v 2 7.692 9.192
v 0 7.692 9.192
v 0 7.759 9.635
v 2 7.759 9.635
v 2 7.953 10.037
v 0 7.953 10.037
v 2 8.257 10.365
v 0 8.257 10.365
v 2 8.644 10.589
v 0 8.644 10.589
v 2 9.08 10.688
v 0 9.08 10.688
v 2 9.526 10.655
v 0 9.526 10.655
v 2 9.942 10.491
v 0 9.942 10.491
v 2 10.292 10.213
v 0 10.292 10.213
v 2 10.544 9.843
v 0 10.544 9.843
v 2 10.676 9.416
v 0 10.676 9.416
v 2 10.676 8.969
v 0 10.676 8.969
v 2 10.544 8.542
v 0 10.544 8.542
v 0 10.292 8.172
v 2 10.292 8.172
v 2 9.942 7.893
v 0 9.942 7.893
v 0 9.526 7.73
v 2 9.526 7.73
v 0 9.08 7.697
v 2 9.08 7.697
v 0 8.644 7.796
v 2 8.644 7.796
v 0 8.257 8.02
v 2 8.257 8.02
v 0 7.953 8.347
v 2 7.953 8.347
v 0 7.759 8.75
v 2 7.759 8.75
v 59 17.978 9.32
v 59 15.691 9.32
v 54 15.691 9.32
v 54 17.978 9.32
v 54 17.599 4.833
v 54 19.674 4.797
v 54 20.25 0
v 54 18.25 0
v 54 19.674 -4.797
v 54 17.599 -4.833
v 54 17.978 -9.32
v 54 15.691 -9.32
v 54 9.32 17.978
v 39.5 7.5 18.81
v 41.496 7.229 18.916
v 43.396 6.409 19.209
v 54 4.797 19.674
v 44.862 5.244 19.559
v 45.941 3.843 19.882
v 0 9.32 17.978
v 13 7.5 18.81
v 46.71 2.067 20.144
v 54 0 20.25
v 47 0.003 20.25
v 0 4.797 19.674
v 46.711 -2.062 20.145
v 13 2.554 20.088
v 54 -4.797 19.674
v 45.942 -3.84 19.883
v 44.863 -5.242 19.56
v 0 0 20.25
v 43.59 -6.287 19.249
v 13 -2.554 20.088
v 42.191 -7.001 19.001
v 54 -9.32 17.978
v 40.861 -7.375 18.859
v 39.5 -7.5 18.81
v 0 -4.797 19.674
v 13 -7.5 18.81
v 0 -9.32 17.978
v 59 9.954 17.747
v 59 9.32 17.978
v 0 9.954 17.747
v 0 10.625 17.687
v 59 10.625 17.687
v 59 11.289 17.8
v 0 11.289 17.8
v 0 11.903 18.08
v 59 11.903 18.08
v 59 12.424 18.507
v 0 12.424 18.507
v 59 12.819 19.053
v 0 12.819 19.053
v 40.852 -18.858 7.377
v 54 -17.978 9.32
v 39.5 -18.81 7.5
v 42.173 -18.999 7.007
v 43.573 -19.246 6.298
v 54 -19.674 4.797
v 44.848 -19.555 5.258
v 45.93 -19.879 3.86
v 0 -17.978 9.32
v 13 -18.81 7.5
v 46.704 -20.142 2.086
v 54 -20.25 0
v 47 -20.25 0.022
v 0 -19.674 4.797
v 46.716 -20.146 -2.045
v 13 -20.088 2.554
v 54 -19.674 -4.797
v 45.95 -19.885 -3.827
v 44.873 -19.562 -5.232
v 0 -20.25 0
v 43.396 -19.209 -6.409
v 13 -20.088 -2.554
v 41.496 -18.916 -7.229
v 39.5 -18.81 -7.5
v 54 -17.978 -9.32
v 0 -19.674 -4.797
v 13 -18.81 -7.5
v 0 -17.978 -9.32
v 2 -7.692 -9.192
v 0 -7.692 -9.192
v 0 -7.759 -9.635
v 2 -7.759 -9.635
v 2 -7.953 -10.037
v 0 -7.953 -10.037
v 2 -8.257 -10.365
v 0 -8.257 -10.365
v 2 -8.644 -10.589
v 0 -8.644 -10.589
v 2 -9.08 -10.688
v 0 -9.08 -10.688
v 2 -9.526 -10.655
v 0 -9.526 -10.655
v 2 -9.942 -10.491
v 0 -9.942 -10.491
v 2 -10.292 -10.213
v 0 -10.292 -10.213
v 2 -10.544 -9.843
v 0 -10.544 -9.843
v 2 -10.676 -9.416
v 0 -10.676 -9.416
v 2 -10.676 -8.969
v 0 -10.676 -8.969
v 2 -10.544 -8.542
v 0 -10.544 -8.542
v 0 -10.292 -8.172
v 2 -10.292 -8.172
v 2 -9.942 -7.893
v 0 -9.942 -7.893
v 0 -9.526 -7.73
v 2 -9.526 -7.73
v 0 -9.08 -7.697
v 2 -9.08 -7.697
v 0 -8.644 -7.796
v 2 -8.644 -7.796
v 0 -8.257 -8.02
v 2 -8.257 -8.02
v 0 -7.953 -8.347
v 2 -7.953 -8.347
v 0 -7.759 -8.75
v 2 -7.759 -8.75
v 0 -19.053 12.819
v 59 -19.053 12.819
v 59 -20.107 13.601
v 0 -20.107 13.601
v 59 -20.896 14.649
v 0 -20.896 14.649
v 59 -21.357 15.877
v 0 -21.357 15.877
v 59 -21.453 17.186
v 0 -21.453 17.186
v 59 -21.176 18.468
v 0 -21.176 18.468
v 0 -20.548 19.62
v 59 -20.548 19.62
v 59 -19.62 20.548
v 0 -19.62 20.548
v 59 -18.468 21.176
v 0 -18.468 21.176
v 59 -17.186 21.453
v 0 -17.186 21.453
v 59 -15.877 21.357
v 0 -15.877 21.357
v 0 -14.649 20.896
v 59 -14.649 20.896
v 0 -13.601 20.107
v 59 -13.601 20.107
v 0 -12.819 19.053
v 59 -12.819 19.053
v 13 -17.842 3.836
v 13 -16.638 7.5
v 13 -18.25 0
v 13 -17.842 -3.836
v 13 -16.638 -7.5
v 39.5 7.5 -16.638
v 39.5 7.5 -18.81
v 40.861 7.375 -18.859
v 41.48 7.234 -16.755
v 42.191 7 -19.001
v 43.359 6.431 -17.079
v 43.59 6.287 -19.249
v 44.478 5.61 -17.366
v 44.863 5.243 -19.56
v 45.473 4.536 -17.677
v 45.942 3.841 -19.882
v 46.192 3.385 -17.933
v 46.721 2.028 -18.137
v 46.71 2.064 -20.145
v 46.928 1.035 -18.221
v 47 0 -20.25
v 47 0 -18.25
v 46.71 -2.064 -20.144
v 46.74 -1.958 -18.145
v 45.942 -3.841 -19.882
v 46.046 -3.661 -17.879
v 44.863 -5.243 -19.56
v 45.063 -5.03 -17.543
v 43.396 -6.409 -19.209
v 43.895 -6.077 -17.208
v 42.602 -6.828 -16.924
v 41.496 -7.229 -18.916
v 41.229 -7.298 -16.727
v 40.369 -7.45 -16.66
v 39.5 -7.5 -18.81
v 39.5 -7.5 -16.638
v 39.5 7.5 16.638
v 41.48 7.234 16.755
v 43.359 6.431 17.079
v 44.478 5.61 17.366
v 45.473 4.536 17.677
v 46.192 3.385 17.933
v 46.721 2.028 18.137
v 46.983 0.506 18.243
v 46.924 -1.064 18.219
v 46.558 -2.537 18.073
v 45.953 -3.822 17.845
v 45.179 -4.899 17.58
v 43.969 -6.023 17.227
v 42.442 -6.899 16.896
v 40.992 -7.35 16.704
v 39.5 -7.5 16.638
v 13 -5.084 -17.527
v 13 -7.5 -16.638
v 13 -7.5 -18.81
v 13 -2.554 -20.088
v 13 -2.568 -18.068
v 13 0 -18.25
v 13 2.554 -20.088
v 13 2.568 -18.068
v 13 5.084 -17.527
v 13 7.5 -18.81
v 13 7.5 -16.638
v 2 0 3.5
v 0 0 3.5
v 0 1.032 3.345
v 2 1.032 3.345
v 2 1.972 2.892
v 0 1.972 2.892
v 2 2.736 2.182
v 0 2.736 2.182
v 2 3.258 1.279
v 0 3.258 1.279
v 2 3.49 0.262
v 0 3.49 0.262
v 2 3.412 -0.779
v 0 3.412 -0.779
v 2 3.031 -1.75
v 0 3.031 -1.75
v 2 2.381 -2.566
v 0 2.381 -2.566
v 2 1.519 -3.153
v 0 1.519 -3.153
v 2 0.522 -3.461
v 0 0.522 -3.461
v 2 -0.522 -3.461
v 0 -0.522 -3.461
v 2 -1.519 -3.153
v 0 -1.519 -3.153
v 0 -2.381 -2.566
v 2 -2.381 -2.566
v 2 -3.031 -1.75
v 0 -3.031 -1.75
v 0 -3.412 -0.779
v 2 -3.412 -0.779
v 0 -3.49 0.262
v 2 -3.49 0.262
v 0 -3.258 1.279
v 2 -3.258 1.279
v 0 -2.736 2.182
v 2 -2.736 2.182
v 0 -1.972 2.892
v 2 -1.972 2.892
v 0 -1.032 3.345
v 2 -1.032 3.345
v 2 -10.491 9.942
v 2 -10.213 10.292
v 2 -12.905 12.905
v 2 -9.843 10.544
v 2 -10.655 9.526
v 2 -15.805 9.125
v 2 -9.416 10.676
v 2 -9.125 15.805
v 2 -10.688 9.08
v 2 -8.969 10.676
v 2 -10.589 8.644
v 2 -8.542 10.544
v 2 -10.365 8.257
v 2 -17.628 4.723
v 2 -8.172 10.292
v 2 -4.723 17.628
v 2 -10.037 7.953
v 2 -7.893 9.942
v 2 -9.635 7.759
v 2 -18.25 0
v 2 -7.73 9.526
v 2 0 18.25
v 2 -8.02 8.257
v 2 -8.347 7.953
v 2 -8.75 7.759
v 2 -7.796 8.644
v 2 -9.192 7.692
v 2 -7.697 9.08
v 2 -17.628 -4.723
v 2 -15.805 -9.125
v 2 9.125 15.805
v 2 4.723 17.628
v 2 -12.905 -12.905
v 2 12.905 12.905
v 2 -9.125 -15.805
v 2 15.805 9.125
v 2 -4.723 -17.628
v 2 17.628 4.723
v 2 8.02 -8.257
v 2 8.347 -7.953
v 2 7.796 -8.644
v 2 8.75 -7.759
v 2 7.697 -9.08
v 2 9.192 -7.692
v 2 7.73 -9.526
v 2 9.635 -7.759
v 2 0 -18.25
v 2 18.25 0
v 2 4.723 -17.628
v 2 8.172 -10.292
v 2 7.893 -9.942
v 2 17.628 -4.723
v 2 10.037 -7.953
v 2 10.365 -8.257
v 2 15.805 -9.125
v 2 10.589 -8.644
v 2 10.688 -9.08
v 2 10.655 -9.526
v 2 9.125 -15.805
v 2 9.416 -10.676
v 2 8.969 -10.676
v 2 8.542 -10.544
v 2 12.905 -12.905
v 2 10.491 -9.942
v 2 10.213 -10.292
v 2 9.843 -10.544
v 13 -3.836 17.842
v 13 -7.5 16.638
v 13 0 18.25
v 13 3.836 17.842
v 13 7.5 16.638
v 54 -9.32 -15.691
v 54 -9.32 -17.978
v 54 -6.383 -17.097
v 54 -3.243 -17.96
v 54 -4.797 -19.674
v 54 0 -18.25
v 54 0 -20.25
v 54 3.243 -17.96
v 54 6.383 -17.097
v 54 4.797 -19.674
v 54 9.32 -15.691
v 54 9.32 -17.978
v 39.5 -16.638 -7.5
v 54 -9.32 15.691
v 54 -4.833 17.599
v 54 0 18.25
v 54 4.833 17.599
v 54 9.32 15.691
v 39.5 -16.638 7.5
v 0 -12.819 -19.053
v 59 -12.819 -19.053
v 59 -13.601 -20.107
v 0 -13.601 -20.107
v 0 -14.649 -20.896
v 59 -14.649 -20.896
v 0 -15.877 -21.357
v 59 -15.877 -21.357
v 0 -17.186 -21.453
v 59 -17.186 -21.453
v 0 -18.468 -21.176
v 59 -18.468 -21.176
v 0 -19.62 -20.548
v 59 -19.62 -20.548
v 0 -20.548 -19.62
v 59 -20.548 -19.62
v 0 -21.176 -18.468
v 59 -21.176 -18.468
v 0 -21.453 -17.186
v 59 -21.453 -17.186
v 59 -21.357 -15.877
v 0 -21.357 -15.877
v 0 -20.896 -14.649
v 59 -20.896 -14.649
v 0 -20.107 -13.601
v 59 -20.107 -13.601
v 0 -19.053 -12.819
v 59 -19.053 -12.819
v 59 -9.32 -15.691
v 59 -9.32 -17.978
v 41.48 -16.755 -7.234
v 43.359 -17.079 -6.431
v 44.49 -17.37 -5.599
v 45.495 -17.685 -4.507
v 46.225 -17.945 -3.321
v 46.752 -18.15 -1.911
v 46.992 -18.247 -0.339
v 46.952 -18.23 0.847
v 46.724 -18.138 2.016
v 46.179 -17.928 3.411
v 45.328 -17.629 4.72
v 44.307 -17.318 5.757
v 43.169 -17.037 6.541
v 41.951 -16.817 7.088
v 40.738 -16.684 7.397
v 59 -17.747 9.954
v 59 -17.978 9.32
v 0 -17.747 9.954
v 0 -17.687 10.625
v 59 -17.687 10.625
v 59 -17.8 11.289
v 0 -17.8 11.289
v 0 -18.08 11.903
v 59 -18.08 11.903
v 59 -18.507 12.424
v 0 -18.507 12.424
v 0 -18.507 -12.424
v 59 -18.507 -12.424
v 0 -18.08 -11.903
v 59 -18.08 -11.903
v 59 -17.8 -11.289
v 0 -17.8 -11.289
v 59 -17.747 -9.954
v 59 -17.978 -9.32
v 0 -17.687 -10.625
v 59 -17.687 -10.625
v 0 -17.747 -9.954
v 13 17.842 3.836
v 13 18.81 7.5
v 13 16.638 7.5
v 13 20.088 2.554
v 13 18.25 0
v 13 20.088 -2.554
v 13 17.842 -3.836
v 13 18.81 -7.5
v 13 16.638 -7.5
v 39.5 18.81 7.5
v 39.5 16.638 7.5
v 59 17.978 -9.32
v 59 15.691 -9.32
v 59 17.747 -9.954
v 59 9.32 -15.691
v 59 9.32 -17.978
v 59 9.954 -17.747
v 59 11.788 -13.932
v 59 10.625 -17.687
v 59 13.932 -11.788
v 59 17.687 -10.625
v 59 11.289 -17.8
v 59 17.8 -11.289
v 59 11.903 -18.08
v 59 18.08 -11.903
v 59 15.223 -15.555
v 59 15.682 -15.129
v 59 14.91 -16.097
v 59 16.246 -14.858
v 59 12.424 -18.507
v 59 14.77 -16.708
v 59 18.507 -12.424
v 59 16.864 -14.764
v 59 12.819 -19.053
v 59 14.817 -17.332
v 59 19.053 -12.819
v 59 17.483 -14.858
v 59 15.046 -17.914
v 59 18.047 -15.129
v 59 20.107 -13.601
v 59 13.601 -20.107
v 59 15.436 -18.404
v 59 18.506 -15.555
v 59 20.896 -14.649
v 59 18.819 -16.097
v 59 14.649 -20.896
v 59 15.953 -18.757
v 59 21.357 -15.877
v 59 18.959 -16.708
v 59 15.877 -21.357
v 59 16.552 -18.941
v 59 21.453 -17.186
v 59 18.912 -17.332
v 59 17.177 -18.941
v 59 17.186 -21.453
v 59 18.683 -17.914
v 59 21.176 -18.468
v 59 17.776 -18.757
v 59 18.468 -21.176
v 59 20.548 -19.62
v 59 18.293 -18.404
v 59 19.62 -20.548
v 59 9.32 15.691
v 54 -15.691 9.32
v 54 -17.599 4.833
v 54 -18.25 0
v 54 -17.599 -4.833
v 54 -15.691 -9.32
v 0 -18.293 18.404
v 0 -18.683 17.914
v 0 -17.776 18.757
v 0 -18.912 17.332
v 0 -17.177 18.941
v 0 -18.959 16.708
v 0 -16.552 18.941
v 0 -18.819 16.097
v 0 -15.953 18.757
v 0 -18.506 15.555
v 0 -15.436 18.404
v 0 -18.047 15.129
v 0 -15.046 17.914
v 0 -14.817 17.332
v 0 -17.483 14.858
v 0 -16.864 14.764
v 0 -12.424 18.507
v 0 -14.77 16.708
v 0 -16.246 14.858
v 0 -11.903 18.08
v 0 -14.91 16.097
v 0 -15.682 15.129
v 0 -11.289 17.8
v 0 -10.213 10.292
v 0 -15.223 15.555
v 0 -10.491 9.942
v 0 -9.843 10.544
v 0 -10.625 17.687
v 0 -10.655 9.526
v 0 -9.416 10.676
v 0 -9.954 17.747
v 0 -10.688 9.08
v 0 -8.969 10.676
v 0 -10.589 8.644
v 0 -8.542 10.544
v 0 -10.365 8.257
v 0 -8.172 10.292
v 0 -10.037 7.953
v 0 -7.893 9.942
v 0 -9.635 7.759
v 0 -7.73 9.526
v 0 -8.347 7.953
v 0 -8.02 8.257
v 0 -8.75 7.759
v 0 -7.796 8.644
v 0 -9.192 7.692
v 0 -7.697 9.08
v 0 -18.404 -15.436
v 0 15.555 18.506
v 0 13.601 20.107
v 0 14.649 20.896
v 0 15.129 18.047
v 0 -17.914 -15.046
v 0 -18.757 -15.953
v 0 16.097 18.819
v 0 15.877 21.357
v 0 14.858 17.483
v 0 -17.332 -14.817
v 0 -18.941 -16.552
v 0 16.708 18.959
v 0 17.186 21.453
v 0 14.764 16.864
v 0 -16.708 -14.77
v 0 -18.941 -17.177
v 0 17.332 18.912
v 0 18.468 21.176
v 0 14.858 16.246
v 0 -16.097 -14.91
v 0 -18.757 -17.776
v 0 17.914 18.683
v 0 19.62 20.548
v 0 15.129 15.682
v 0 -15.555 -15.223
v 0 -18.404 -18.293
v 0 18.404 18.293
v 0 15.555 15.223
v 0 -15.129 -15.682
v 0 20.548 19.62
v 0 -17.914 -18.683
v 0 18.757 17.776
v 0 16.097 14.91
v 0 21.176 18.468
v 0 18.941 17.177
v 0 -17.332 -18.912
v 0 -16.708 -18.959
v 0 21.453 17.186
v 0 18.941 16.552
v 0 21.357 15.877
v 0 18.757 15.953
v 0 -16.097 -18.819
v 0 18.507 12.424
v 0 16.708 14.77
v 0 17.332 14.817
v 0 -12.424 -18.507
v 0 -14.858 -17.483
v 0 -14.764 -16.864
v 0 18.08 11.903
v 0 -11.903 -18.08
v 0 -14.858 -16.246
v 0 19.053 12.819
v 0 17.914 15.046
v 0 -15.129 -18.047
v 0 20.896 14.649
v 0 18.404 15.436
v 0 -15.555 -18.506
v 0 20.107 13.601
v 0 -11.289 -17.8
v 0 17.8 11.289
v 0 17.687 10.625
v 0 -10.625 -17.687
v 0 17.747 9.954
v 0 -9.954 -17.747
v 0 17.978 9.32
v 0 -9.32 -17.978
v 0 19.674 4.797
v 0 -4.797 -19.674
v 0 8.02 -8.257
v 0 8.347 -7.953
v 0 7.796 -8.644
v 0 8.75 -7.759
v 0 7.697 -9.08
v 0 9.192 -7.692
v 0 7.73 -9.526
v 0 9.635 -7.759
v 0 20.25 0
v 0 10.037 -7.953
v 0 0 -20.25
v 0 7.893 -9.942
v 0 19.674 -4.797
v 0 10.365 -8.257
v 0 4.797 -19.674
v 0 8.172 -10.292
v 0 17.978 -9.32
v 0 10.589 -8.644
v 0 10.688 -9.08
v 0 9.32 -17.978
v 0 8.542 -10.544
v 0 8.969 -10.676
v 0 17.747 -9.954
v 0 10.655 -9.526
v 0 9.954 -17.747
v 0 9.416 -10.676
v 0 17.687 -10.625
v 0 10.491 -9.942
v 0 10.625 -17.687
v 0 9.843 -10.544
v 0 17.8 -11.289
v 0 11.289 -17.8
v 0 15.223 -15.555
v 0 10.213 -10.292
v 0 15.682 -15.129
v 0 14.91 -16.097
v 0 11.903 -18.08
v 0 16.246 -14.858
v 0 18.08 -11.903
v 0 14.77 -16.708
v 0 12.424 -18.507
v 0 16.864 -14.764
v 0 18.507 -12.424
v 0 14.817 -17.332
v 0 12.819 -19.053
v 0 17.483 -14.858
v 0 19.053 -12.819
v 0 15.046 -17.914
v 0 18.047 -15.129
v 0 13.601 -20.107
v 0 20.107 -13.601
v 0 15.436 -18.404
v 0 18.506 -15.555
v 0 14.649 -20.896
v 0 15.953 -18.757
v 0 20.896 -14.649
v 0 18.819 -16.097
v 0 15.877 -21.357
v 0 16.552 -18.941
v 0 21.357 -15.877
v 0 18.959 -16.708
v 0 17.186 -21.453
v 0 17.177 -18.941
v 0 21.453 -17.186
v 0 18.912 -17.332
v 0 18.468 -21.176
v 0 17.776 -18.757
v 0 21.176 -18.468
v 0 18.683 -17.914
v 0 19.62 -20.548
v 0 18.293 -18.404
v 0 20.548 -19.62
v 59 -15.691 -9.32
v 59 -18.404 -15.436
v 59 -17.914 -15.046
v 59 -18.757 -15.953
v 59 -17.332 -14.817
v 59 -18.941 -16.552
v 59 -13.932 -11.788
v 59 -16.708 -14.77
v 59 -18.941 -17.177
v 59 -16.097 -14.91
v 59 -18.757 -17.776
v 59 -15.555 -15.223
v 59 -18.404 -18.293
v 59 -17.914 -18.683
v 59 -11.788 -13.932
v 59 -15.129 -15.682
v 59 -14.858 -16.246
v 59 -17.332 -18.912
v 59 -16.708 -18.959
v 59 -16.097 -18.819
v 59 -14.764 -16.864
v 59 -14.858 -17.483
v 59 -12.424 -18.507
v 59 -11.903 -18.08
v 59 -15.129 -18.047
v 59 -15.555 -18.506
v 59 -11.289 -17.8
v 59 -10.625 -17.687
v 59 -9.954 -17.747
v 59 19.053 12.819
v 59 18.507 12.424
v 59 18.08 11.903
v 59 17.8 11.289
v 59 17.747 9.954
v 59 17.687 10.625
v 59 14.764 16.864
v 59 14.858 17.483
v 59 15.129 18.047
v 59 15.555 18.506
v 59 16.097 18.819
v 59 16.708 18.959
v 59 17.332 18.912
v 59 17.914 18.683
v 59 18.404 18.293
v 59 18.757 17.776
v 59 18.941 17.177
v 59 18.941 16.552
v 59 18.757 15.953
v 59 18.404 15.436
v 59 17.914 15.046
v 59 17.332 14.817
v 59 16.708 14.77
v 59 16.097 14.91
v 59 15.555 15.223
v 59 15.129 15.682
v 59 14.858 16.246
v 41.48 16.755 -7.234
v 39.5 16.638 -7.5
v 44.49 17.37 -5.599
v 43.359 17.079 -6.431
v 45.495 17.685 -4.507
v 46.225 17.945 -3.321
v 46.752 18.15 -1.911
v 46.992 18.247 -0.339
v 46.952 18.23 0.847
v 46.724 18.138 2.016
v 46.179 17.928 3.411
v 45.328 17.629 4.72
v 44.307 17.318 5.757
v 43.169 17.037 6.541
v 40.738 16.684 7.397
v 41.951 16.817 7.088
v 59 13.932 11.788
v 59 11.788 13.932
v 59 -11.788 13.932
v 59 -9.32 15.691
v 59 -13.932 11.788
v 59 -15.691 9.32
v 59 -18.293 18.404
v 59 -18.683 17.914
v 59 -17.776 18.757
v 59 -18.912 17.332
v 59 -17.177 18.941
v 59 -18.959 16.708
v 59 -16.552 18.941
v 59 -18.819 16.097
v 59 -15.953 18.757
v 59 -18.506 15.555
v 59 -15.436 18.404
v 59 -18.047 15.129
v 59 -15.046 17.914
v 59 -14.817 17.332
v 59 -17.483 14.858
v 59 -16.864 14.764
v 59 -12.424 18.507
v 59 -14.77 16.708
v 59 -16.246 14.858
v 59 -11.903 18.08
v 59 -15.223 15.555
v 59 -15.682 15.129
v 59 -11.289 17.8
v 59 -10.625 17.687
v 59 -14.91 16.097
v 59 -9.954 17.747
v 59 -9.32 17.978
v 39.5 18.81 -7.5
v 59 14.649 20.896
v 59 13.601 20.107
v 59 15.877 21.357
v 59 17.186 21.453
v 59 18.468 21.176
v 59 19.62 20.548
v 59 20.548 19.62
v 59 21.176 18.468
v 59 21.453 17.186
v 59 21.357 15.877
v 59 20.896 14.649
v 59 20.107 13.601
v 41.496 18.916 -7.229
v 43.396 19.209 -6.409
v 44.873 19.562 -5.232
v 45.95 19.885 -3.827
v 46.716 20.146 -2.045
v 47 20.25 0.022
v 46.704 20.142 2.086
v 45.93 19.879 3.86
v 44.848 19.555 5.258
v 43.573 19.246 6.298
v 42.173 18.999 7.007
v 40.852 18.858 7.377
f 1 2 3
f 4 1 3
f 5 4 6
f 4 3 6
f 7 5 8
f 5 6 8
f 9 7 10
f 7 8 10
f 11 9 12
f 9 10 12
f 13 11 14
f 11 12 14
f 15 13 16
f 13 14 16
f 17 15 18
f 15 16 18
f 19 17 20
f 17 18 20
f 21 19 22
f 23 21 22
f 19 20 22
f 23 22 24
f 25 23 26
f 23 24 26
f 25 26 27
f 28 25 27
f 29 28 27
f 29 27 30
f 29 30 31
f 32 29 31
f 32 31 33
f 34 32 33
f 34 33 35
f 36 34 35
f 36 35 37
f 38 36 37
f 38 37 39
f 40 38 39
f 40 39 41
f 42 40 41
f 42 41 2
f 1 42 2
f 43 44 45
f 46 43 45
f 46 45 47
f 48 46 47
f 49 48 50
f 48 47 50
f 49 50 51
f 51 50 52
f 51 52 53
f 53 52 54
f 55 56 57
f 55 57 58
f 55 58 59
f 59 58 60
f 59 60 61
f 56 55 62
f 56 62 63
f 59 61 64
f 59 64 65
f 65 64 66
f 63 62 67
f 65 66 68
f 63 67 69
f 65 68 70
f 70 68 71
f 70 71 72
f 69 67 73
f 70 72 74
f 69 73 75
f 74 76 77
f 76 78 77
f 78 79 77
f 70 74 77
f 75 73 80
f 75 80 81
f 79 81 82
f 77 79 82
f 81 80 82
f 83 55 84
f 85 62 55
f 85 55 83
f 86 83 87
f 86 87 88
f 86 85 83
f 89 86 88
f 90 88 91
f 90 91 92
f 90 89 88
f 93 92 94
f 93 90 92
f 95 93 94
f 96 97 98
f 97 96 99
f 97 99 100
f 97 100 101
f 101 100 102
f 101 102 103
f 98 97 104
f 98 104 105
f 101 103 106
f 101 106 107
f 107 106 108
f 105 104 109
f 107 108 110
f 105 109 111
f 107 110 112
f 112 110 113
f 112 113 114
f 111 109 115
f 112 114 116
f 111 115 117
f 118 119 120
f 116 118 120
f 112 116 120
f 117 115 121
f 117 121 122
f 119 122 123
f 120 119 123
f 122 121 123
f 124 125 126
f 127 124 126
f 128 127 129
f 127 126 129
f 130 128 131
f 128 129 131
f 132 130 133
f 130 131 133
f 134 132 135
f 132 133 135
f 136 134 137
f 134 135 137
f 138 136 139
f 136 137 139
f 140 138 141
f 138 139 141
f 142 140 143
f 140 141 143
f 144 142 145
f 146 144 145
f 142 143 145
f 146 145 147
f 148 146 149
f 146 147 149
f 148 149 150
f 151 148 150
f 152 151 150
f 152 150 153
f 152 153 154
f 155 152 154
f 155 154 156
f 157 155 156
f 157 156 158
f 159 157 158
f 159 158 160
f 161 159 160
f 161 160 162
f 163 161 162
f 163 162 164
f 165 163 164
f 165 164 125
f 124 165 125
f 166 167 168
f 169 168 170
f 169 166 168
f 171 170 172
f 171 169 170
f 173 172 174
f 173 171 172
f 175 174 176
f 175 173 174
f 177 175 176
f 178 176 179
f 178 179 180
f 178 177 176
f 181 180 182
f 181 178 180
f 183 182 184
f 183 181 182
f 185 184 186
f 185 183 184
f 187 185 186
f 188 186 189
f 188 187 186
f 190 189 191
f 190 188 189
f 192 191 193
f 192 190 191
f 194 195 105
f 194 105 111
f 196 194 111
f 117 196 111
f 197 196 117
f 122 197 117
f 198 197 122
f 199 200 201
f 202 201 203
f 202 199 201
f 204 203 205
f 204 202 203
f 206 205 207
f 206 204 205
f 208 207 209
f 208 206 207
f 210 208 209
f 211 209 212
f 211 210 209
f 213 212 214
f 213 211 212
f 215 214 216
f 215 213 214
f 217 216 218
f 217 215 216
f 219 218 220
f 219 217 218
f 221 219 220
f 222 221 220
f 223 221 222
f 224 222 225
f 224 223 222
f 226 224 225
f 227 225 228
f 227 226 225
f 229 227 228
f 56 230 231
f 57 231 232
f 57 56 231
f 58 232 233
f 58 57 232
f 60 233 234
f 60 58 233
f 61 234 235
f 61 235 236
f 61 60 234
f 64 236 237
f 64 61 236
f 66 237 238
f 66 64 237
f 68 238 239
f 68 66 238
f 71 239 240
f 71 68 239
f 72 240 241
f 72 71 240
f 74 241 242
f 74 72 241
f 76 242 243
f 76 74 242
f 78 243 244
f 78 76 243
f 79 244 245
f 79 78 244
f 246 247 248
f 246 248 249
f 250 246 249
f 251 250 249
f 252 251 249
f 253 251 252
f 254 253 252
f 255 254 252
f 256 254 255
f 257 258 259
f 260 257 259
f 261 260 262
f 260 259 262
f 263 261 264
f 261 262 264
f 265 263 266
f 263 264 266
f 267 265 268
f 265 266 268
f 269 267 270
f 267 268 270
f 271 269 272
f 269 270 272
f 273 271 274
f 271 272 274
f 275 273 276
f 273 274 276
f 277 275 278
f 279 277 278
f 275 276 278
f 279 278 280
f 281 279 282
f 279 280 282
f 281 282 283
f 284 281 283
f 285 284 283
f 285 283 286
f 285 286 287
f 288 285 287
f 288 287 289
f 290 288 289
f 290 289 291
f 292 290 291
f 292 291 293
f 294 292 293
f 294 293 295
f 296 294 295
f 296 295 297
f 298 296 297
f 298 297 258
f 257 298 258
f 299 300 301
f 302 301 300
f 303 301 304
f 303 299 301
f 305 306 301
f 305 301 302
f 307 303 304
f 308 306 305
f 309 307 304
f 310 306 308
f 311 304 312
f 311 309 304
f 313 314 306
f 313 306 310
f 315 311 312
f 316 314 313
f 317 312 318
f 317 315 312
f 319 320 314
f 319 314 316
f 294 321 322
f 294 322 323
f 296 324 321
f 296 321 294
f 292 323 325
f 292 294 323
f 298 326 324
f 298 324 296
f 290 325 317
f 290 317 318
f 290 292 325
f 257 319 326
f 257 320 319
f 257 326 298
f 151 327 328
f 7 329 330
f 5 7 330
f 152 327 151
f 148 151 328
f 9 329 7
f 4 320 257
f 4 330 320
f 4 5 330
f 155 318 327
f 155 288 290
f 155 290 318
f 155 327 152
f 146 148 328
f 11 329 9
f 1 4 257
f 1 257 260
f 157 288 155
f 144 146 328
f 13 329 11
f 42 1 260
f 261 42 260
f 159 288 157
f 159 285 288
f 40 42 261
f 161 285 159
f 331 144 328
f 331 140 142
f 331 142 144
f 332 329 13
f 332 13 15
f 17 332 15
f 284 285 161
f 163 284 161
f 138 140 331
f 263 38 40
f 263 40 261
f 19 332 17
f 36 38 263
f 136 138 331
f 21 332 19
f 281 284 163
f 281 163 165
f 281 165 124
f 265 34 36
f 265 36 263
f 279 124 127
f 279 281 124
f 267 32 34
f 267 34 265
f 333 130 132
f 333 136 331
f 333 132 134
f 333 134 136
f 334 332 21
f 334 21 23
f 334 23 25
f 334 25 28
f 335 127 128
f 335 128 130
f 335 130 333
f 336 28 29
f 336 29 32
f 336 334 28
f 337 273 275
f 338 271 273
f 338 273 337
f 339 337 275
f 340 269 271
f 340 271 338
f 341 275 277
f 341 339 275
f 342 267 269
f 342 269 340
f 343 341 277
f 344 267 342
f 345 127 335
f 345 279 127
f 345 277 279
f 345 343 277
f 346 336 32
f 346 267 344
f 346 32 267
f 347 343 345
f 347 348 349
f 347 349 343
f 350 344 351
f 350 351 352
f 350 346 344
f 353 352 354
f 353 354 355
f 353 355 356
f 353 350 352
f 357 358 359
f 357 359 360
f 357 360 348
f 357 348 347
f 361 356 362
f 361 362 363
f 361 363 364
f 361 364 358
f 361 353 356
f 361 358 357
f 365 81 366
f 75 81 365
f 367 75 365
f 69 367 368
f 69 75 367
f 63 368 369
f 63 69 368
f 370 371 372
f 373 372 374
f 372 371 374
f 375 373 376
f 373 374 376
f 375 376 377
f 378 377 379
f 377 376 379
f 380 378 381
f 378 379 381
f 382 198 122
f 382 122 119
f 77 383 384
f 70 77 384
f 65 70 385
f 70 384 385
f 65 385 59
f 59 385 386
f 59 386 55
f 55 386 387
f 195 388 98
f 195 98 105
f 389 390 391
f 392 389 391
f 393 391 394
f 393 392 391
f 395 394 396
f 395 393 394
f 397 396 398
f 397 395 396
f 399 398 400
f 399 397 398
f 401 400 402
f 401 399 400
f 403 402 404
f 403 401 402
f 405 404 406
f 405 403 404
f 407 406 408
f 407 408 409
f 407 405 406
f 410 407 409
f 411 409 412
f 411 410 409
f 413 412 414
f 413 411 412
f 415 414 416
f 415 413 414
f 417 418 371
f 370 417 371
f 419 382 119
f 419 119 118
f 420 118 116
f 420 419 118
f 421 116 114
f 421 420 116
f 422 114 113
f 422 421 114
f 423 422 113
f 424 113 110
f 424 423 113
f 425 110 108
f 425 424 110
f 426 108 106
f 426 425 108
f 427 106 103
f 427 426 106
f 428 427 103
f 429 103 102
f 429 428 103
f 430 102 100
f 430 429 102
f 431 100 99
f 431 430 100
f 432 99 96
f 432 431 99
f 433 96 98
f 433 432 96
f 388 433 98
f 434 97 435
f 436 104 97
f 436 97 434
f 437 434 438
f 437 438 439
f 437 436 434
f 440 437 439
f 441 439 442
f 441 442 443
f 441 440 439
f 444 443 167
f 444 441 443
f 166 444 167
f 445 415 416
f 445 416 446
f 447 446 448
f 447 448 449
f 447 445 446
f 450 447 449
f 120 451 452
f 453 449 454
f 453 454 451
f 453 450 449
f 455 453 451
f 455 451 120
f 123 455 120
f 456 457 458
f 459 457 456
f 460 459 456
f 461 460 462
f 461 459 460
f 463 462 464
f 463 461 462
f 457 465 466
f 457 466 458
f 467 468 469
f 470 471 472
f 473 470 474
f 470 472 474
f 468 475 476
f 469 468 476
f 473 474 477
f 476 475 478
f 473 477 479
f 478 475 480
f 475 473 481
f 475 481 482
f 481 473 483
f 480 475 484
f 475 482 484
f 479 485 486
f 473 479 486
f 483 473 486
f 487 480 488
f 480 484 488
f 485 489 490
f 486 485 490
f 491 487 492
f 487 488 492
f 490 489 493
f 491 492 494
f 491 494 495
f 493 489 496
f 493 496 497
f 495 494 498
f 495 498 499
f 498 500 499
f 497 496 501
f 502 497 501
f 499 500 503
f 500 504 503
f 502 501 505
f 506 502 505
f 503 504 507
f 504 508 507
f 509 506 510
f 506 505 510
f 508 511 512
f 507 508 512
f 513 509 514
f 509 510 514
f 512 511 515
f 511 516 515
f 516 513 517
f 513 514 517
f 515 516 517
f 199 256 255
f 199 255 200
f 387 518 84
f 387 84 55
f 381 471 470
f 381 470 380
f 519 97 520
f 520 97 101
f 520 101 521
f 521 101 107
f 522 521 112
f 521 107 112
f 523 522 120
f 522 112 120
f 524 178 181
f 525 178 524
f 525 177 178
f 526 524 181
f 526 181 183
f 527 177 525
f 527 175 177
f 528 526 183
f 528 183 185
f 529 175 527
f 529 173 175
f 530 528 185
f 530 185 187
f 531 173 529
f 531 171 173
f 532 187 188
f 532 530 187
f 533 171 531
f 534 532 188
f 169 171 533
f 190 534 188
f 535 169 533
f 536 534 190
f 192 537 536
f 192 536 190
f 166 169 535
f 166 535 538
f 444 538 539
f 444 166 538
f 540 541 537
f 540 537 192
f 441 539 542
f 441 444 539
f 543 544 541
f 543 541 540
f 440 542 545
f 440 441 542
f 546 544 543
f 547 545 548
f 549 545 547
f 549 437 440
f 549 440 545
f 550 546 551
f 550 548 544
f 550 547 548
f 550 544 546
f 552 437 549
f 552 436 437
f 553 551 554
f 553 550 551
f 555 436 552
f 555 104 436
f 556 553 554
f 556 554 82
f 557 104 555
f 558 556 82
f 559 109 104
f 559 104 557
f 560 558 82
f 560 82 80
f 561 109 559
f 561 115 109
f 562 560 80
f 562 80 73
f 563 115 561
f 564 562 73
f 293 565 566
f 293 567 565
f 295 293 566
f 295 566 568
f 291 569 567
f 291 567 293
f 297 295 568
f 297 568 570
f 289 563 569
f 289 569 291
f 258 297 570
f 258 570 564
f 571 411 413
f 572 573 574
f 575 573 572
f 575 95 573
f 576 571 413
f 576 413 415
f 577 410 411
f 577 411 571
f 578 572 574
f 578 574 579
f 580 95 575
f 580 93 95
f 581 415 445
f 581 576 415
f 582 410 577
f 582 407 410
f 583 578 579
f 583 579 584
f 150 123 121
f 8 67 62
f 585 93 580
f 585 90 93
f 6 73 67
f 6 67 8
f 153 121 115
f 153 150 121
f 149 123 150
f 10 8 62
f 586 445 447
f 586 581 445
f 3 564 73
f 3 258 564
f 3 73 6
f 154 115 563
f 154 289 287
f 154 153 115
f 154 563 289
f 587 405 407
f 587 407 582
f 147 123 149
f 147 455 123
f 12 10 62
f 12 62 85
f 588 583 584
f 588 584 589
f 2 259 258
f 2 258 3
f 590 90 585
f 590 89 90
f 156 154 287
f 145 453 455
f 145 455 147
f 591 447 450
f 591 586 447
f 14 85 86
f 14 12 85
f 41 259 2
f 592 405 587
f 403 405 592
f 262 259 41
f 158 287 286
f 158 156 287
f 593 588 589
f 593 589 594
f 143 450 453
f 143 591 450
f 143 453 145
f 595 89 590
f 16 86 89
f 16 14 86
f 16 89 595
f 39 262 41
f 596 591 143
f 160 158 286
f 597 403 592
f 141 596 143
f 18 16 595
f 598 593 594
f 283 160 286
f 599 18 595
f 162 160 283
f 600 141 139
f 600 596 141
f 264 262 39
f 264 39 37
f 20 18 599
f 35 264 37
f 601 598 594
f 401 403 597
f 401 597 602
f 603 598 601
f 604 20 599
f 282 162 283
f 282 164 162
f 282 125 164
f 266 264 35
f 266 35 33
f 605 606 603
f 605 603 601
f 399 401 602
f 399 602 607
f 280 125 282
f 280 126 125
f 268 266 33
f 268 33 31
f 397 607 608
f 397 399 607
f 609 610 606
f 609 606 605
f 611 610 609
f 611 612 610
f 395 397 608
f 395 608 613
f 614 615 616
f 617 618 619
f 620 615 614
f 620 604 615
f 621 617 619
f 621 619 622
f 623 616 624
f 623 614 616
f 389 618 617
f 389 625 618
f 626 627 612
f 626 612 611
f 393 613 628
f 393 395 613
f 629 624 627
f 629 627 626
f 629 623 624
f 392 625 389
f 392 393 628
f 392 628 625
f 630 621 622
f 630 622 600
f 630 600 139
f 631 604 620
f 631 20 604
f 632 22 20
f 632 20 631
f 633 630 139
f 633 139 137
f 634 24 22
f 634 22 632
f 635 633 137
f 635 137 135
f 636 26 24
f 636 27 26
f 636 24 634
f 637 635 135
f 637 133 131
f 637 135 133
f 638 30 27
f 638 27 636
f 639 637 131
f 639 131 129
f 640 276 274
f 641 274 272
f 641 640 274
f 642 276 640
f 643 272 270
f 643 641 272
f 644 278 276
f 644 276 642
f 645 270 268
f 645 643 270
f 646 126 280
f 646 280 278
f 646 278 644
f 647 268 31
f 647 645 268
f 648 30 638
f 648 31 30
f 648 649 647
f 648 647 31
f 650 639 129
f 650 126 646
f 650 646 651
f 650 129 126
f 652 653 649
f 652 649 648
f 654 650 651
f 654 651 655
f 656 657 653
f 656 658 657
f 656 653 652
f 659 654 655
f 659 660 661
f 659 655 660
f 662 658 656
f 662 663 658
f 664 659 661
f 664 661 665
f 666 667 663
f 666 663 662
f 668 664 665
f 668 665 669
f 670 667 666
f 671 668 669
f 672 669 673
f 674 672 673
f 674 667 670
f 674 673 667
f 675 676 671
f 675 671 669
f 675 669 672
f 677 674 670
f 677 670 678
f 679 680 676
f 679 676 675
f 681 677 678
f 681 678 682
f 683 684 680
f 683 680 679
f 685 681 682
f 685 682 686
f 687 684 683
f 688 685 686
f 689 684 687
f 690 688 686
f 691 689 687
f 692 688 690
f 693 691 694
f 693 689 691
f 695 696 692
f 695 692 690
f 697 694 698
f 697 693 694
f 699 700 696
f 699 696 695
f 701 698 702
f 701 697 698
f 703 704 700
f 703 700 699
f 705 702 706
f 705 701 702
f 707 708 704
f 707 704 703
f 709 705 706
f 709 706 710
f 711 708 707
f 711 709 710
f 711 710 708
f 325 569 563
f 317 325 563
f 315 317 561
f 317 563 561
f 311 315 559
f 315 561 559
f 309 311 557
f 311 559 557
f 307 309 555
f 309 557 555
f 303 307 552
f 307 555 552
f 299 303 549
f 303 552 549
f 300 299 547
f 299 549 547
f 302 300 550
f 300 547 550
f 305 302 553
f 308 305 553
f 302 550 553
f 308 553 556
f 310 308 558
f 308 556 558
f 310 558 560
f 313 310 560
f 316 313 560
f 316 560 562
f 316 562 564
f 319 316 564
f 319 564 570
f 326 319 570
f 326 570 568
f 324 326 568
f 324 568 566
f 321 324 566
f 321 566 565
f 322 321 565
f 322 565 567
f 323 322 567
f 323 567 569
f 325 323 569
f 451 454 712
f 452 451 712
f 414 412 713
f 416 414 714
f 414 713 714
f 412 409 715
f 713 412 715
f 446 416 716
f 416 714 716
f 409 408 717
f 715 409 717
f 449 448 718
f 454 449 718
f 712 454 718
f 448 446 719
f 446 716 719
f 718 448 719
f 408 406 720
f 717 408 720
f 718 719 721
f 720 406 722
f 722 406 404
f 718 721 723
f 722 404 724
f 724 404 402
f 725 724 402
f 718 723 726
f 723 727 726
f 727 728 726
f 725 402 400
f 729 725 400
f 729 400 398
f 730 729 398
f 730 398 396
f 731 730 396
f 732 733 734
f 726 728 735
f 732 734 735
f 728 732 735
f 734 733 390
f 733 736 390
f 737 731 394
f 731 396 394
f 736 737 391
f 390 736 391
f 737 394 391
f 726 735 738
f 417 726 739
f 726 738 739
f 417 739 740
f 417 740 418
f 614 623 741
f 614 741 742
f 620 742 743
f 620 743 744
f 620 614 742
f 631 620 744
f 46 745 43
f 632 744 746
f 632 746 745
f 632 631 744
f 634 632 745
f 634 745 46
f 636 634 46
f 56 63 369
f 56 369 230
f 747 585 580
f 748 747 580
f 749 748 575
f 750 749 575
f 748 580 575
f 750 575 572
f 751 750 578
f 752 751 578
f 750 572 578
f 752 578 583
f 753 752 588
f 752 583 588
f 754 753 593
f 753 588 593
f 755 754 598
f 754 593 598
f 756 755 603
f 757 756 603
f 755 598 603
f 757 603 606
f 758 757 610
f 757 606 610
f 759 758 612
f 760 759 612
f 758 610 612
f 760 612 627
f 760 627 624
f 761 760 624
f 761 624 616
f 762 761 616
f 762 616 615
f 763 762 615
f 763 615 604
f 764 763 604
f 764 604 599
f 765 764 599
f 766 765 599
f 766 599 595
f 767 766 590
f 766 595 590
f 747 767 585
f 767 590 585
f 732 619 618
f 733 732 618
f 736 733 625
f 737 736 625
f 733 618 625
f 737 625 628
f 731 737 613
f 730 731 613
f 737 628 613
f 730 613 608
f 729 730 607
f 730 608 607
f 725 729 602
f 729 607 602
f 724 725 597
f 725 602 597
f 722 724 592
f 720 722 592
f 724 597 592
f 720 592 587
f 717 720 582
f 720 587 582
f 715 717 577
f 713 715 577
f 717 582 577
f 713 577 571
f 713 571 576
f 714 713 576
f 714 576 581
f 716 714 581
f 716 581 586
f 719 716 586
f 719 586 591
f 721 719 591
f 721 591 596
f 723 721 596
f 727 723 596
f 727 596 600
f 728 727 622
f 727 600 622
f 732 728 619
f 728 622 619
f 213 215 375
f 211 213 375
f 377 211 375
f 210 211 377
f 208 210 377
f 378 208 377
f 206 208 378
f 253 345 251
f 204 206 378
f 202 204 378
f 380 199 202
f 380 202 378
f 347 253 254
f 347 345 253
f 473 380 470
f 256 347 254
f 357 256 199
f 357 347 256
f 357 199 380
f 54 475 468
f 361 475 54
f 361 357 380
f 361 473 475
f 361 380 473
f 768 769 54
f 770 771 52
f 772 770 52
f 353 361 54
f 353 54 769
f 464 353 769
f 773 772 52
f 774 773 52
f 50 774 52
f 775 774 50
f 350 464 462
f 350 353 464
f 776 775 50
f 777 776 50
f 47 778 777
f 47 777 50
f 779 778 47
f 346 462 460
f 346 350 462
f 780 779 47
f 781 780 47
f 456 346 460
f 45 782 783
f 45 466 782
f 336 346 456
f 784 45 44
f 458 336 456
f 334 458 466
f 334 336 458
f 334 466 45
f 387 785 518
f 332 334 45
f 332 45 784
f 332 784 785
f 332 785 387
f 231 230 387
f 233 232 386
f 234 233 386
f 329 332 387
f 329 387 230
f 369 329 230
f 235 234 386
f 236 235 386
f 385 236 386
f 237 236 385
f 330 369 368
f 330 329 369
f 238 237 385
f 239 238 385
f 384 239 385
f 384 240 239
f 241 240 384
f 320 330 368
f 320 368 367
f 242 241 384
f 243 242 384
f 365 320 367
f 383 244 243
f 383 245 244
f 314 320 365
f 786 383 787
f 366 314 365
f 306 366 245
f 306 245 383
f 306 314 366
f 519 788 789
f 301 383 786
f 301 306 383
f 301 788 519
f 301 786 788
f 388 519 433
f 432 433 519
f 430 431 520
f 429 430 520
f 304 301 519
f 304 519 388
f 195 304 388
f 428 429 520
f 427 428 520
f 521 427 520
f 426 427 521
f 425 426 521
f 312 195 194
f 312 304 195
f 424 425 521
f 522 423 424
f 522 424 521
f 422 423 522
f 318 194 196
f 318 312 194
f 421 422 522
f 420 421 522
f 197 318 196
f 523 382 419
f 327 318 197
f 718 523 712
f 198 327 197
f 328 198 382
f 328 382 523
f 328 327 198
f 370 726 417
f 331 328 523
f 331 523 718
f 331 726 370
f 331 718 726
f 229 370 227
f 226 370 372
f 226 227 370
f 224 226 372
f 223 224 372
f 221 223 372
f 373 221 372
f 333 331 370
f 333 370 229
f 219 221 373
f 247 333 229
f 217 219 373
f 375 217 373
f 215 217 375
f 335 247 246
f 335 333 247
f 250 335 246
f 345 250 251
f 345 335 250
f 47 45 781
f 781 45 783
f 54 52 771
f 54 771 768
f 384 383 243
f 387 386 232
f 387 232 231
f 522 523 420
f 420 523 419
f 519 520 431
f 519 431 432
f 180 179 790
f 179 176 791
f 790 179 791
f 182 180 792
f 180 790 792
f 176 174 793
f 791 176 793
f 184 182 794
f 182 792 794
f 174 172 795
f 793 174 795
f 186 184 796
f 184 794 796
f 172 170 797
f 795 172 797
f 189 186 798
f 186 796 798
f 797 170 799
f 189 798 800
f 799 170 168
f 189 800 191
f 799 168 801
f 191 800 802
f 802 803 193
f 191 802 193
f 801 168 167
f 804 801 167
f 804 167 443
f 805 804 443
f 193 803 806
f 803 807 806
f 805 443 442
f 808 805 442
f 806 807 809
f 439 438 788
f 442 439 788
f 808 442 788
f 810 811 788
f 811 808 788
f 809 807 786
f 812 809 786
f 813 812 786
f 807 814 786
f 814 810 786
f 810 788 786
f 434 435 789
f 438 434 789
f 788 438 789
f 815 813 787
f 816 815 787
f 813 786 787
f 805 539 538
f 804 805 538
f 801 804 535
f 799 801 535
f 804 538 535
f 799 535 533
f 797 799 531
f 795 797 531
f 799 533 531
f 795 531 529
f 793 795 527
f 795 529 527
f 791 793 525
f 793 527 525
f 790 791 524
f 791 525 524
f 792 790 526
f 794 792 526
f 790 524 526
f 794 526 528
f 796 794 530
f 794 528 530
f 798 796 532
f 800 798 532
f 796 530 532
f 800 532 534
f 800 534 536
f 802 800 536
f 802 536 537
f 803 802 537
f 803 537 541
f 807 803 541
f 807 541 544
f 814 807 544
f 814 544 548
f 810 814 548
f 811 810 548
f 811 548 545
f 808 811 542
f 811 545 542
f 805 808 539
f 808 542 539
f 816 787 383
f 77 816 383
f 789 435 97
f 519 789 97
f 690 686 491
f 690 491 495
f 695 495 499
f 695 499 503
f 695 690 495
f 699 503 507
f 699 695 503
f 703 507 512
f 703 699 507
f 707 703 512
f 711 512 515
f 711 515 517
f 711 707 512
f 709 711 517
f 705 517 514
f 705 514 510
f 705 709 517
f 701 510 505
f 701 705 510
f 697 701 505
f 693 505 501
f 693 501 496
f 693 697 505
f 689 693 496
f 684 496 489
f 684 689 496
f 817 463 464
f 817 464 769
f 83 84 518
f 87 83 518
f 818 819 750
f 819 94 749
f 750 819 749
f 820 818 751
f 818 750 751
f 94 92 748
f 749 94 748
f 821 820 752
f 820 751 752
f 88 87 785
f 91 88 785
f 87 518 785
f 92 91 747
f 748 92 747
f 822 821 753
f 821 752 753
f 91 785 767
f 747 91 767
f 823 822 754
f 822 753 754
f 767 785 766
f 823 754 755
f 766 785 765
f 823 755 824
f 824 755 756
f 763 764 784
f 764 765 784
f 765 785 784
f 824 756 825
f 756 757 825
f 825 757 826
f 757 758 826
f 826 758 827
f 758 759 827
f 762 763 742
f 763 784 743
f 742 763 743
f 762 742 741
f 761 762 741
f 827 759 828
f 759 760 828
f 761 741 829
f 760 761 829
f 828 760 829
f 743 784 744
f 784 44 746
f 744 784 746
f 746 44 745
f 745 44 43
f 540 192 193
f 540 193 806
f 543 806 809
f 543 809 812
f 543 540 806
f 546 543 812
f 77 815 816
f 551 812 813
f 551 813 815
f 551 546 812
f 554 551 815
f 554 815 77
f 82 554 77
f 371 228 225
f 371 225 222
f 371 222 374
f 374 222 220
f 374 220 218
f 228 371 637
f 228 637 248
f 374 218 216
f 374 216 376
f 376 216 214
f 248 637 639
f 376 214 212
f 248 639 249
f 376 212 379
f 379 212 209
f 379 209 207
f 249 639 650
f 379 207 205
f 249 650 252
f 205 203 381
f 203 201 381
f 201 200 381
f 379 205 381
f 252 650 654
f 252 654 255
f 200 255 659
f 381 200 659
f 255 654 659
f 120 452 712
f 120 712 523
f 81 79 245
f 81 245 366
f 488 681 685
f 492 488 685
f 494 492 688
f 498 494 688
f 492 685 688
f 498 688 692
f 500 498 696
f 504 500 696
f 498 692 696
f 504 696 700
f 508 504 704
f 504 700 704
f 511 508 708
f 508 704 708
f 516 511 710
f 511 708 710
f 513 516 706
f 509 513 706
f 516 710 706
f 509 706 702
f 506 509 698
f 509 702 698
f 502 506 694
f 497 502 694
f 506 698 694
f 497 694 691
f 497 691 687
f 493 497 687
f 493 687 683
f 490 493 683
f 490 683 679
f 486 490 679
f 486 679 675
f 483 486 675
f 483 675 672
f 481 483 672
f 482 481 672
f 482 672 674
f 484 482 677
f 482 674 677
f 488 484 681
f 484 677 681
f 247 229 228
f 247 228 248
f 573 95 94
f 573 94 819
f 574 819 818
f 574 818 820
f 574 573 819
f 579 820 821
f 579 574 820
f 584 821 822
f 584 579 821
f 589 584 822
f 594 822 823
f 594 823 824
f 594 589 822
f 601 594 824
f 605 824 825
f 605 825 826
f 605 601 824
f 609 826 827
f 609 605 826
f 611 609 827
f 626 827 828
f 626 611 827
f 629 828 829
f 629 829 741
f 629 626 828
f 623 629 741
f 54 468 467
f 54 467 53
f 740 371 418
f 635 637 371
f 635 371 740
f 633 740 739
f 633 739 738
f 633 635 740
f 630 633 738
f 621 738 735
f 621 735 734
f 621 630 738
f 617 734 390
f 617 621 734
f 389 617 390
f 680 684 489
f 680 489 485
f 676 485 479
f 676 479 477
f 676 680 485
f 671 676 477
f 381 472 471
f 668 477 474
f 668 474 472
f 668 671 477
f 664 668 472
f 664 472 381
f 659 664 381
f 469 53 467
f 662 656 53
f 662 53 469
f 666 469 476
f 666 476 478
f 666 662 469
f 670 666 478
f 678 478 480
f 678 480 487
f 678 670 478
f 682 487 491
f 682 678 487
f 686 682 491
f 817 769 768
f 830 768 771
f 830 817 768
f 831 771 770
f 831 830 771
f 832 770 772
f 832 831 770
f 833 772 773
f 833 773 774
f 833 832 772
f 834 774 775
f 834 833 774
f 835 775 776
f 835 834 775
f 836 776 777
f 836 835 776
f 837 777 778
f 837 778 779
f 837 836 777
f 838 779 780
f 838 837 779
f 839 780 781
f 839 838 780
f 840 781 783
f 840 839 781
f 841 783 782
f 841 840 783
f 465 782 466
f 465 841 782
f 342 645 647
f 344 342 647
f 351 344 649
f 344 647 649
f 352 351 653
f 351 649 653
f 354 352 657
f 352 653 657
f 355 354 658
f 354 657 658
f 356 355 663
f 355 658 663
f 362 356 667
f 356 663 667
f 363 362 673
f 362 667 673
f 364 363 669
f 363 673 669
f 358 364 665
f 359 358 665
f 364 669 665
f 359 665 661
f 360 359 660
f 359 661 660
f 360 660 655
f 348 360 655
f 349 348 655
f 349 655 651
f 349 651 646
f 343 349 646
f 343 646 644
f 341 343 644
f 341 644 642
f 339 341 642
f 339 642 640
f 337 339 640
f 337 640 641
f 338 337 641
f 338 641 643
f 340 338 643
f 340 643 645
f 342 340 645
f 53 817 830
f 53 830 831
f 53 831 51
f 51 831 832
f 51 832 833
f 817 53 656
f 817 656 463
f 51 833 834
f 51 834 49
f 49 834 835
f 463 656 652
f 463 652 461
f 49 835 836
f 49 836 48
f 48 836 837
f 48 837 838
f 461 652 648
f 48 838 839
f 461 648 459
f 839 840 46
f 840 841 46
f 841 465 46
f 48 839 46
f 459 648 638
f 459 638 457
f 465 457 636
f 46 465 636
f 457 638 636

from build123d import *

# Parameters (mm, degrees)
SKETCH_1_R               = 20.25
EXTRUDE_1_DEPTH          = 2
SKETCH_2_R               = 3.5
CUT_EXTRUDE_1_DEPTH      = 3
SKETCH_3_R               = 20.25
SKETCH_3_R_2             = 10.25
EXTRUDE_2_DEPTH          = 4.1
SKETCH_5_R               = 20.25
SKETCH_5_R_2             = 16.25
EXTRUDE_3_DEPTH          = 5.4
SKETCH_6_R               = 20.25
SKETCH_6_R_2             = 18.25
EXTRUDE_4_DEPTH          = 47.5
SKETCH_7_R               = 1.5
CUT_EXTRUDE_2_DEPTH      = 60
PATTERN_CIRCULAR_1_COUNT = 4
FILLET_1_R               = 0.5
SKETCH_9_R               = 4.6
SKETCH_9_R_2             = 2.1
EXTRUDE_6_DEPTH          = 59
EXTRUDE_7_DEPTH          = 59
PATTERN_CIRCULAR_3_COUNT = 4
CUT_EXTRUDE_3_DEPTH      = 22.464496731
PATTERN_CIRCULAR_4_COUNT = 2
PATTERN_CIRCULAR_4_ANGLE = 270
SKETCH_22_R              = 18.25
CUT_EXTRUDE_9_DEPTH      = 20
SKETCH_23_W              = 5
SKETCH_23_H              = 18.640041254
CUT_EXTRUDE_10_DEPTH     = 43.928993463
PATTERN_CIRCULAR_5_COUNT = 2
PATTERN_CIRCULAR_5_ANGLE = 270


with BuildPart() as part:
    # Эскиз1 → Бобышка-Вытянуть1 (new body)
    with BuildSketch(Plane(origin=(0, 0, 0), x_dir=(0, 0, -1), z_dir=(1, 0, 0))):
        Circle(SKETCH_1_R)
    extrude(amount=EXTRUDE_1_DEPTH)

    # Эскиз2 → Вырез-Вытянуть1 (cut, through all)
    with BuildSketch(Plane.ZY):
        Circle(SKETCH_2_R)
    extrude(amount=-CUT_EXTRUDE_1_DEPTH, mode=Mode.SUBTRACT)

    # Эскиз3 → Бобышка-Вытянуть2 (add)
    with BuildSketch(Plane(origin=(2, 0, 0), x_dir=(0, 0, -1), z_dir=(1, 0, 0))):
        Circle(SKETCH_3_R)
        Circle(SKETCH_3_R_2, mode=Mode.SUBTRACT)
    extrude(amount=EXTRUDE_2_DEPTH)

    # Эскиз5 → Бобышка-Вытянуть3 (add)
    with BuildSketch(Plane(origin=(6.1, 0, 0), x_dir=(0, 0, -1), z_dir=(1, 0, 0))):
        Circle(SKETCH_5_R)
        Circle(SKETCH_5_R_2, mode=Mode.SUBTRACT)
    extrude(amount=EXTRUDE_3_DEPTH)

    # Эскиз6 → Бобышка-Вытянуть4 (add)
    with BuildSketch(Plane(origin=(11.5, 0, 0), x_dir=(0, 0, -1), z_dir=(1, 0, 0))):
        Circle(SKETCH_6_R)
        Circle(SKETCH_6_R_2, mode=Mode.SUBTRACT)
    extrude(amount=EXTRUDE_4_DEPTH)

    # Эскиз7 → Вырез-Вытянуть2 (cut, through all)
    with BuildSketch(Plane.ZY):
        with Locations((-9.192388155, 9.192388155)):
            Circle(SKETCH_7_R)
    cut_extrude_2 = extrude(amount=-CUT_EXTRUDE_2_DEPTH, mode=Mode.SUBTRACT)

    # Круговой массив1: Вырез-Вытянуть2 ×4 about axis
    pattern_circular_1_axis = Axis((0, 0, 0), (1, 0, 0))
    for i in range(1, PATTERN_CIRCULAR_1_COUNT):
        add(cut_extrude_2.rotate(pattern_circular_1_axis, i * 360 / PATTERN_CIRCULAR_1_COUNT), mode=Mode.SUBTRACT)

    # Скругление1
    fillet_1_edges = [part.edges().sort_by_distance(p)[0] for p in [
        (2, 0, 10.25),
        (6.1, 0, 10.25),
        (6.1, 0, 16.25),
        (11.5, 0, 16.25),
        (11.5, 0, 18.25),
    ]]
    fillet(fillet_1_edges, radius=FILLET_1_R)

    # Эскиз9 → Бобышка-Вытянуть6 (add)
    with BuildSketch(Plane.ZY):
        with Locations((-16.864496731, 16.864496731)):
            Circle(SKETCH_9_R)
        with Locations((-16.864496731, 16.864496731)):
            Circle(SKETCH_9_R_2, mode=Mode.SUBTRACT)
    extrude_6 = extrude(amount=-EXTRUDE_6_DEPTH)

    # Эскиз10 → Бобышка-Вытянуть7 (add)
    with BuildSketch(Plane.ZY):
        with BuildLine():
            ThreePointArc((-9.320020627, 17.977756131), (-11.289373131, 17.800047957), (-12.818708454, 19.053468456))
            ThreePointArc((-12.818708454, 19.053468456), (-12.323239372, 17.597287013), (-12.335539952, 16.059170405))
            ThreePointArc((-12.335539952, 16.059170405), (-10.870191755, 17.085123096), (-9.320020627, 17.977756131))
        make_face()
        with BuildLine():
            ThreePointArc((-16.059170405, 12.335539952), (-17.597287013, 12.323239372), (-19.053468456, 12.818708454))
            ThreePointArc((-19.053468456, 12.818708454), (-17.800047957, 11.289373131), (-17.977756131, 9.320020627))
            ThreePointArc((-17.977756131, 9.320020627), (-17.085123096, 10.870191755), (-16.059170405, 12.335539952))
        make_face()
    extrude_7 = extrude(amount=-EXTRUDE_7_DEPTH)

    # Круговой массив3: Бобышка-Вытянуть6, Бобышка-Вытянуть7 ×4 about axis
    pattern_circular_3_axis = Axis((0, 0, 0), (1, 0, 0))
    for i in range(1, PATTERN_CIRCULAR_3_COUNT):
        add(extrude_6.rotate(pattern_circular_3_axis, i * 360 / PATTERN_CIRCULAR_3_COUNT))
        add(extrude_7.rotate(pattern_circular_3_axis, i * 360 / PATTERN_CIRCULAR_3_COUNT))

    # Эскиз11 → Вырез-Вытянуть3 (cut, symmetric)
    with BuildSketch(Plane(origin=(0, 0, 0), x_dir=(1, 0, 0), z_dir=(0, 1, 0))):
        with BuildLine():
            Line((13, 7.5), (39.5, 7.5))
            ThreePointArc((39.5, 7.5), (47, 0), (39.5, -7.5))
            Line((39.5, -7.5), (13, -7.5))
            Line((13, -7.5), (13, 7.5))
        make_face()
    cut_extrude_3 = extrude(amount=CUT_EXTRUDE_3_DEPTH, both=True, mode=Mode.SUBTRACT)

    # Круговой массив4: Вырез-Вытянуть3 ×2 about axis
    pattern_circular_4_axis = Axis((2, 0, 0), (-1, 0, 0))
    for i in range(1, PATTERN_CIRCULAR_4_COUNT):
        add(cut_extrude_3.rotate(pattern_circular_4_axis, i * PATTERN_CIRCULAR_4_ANGLE / (PATTERN_CIRCULAR_4_COUNT - 1)), mode=Mode.SUBTRACT)

    # Эскиз22 → Вырез-Вытянуть9 (cut)
    with BuildSketch(Plane(origin=(2, 0, 0), x_dir=(0, 0, -1), z_dir=(1, 0, 0))):
        Circle(SKETCH_22_R)
    extrude(amount=CUT_EXTRUDE_9_DEPTH, mode=Mode.SUBTRACT)

    # Эскиз23 → Вырез-Вытянуть10 (cut, through all)
    with BuildSketch(Plane(origin=(0, -21.464496731, 0), x_dir=(-1, 0, 0), z_dir=(0, -1, 0))):
        with Locations((-56.5, 0)):
            Rectangle(SKETCH_23_W, SKETCH_23_H)
    cut_extrude_10 = extrude(amount=-CUT_EXTRUDE_10_DEPTH, mode=Mode.SUBTRACT)

    # Круговой массив5: Вырез-Вытянуть10 ×2 about axis
    pattern_circular_5_axis = Axis((2, 0, 0), (-1, 0, 0))
    for i in range(1, PATTERN_CIRCULAR_5_COUNT):
        add(cut_extrude_10.rotate(pattern_circular_5_axis, i * PATTERN_CIRCULAR_5_ANGLE / (PATTERN_CIRCULAR_5_COUNT - 1)), mode=Mode.SUBTRACT)


solid = part.part
